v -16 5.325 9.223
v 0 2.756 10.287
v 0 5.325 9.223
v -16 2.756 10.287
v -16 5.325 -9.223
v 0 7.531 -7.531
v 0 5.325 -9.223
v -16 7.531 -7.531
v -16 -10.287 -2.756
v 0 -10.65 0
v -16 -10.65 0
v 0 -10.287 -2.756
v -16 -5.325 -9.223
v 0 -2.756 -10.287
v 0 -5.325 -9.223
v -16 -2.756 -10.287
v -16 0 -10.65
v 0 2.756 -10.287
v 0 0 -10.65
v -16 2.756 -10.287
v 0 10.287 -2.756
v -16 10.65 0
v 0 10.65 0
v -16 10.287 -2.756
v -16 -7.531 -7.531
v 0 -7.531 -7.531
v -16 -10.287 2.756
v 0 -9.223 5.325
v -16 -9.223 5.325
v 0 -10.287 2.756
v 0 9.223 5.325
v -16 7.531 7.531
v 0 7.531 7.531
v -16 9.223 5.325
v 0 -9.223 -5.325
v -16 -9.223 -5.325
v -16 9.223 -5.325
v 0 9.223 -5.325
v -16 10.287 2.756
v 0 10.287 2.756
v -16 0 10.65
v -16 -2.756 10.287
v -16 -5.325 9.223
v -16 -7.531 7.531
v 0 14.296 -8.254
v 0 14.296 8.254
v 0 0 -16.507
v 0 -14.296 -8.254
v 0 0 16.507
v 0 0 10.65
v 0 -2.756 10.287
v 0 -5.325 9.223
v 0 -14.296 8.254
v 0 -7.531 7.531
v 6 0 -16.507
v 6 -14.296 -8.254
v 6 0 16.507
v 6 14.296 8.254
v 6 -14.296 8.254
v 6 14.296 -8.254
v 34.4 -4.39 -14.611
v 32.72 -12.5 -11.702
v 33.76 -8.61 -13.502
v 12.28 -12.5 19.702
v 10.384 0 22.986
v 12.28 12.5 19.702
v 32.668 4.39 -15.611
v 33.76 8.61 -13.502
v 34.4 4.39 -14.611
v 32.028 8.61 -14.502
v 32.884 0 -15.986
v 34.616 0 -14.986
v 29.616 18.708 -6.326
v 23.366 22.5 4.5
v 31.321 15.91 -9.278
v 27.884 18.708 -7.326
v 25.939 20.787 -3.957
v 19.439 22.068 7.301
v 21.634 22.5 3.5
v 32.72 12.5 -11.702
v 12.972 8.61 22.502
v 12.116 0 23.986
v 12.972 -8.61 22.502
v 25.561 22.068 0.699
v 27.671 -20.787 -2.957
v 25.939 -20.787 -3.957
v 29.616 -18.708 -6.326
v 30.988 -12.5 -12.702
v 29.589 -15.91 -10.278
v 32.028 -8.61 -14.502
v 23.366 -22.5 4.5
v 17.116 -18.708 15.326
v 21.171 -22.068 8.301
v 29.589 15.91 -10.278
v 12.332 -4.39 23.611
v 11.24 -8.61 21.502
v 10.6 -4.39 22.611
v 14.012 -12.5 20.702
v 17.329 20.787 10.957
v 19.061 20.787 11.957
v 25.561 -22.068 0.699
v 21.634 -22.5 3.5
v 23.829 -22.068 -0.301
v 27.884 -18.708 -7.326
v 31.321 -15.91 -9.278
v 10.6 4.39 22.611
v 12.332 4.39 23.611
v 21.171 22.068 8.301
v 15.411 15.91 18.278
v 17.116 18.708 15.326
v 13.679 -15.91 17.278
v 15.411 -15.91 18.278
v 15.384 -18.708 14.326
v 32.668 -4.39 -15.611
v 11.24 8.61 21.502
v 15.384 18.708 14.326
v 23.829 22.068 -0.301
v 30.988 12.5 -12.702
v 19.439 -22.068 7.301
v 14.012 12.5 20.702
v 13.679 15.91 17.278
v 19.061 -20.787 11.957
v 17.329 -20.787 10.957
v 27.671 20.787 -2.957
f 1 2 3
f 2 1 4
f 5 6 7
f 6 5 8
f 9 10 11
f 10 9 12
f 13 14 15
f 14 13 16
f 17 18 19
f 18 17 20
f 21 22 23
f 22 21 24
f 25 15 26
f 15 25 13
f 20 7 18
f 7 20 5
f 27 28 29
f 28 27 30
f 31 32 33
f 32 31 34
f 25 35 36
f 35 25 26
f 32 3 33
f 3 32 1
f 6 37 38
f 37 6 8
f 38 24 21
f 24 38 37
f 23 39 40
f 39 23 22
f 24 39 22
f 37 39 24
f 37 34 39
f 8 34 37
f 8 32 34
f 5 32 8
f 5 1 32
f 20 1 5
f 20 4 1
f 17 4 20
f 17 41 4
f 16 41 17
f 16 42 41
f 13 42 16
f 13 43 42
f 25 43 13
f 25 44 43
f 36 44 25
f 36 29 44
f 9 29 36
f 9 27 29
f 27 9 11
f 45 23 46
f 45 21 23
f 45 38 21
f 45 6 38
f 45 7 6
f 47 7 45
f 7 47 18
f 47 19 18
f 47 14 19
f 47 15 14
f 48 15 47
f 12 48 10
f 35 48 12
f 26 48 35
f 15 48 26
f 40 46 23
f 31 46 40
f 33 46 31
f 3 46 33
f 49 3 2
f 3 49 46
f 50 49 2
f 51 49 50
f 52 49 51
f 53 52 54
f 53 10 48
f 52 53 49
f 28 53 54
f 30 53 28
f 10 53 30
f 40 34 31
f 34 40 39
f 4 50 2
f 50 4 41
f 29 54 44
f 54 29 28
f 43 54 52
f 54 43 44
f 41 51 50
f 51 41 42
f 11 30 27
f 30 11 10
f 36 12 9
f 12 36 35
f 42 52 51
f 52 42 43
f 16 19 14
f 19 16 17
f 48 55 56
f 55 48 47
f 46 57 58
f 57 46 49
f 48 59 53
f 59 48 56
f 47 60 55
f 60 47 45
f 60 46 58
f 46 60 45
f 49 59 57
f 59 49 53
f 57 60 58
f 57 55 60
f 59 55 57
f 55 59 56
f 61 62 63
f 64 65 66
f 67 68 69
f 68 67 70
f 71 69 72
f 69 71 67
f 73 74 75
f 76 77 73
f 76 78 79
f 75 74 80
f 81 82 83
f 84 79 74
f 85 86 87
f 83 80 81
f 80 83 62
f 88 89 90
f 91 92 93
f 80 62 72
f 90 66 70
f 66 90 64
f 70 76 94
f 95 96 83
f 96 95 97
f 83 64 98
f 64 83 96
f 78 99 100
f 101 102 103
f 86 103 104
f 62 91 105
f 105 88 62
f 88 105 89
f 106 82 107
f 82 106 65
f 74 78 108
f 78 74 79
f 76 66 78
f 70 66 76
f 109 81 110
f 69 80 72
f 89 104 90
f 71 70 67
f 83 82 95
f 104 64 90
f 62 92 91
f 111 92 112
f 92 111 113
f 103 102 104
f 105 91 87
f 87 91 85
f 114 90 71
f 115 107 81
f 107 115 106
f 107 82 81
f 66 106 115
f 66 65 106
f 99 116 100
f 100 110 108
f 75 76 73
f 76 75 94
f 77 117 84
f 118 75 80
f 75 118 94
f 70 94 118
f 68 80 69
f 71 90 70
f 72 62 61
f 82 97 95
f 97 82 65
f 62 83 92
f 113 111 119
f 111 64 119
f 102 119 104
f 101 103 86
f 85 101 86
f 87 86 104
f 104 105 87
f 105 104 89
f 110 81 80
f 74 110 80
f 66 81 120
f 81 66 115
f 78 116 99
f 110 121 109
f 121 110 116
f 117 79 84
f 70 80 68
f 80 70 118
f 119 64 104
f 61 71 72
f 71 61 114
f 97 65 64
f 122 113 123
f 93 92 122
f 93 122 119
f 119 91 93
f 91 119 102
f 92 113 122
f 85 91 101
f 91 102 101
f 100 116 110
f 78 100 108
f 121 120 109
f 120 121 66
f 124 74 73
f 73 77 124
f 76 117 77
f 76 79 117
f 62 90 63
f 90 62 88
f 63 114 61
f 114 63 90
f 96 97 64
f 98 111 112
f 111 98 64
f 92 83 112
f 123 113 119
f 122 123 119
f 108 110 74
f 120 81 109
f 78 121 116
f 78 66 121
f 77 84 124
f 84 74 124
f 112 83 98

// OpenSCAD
// Sidewall sprinkler head. Thread -X, deflector projects +X.
//
//   inlet: (-L/2, 0, 0), dir (-1, 0, 0)

// @part head_sidewall
// @kind sprinkler_head
// @category head.sidewall.k56
// @display-name "Sidewall Sprinkler K5.6 (1/2\" NPT)"
// @mfg tyco
// @mfg-pn TY3331
// @listing UL FM
// @hazard-classes LH OH1
// @price-usd 26.50
// @install-minutes 6
// @crew journeyman
// @k-factor 5.6
// @orientation sidewall
// @response standard
// @temperature 155F
// @param size_in enum[0.5,0.75] default=0.5 label="Size" unit="in"
// @port inlet position=[-0.008,0,0] direction=[-1,0,0] style=NPT_threaded size_in=0.5 role=drop

thread_od    = 21.3;
thread_len   = 16;
deflector_d  = 45;
deflector_h  = 2;

union() {
    translate([-thread_len/2, 0, 0])
        rotate([0, 90, 0])
        cylinder(h = thread_len, d = thread_od, center = true, $fn = 24);
    // Wrench flats
    translate([3, 0, 0])
        rotate([0, 90, 0])
        cylinder(h = 6, d = thread_od * 1.55, $fn = 6, center = true);
    // Angled deflector vane
    translate([deflector_d/2, 0, 4])
        rotate([0, 60, 0])
        cylinder(h = deflector_h, d = deflector_d, center = true, $fn = 32);
}
